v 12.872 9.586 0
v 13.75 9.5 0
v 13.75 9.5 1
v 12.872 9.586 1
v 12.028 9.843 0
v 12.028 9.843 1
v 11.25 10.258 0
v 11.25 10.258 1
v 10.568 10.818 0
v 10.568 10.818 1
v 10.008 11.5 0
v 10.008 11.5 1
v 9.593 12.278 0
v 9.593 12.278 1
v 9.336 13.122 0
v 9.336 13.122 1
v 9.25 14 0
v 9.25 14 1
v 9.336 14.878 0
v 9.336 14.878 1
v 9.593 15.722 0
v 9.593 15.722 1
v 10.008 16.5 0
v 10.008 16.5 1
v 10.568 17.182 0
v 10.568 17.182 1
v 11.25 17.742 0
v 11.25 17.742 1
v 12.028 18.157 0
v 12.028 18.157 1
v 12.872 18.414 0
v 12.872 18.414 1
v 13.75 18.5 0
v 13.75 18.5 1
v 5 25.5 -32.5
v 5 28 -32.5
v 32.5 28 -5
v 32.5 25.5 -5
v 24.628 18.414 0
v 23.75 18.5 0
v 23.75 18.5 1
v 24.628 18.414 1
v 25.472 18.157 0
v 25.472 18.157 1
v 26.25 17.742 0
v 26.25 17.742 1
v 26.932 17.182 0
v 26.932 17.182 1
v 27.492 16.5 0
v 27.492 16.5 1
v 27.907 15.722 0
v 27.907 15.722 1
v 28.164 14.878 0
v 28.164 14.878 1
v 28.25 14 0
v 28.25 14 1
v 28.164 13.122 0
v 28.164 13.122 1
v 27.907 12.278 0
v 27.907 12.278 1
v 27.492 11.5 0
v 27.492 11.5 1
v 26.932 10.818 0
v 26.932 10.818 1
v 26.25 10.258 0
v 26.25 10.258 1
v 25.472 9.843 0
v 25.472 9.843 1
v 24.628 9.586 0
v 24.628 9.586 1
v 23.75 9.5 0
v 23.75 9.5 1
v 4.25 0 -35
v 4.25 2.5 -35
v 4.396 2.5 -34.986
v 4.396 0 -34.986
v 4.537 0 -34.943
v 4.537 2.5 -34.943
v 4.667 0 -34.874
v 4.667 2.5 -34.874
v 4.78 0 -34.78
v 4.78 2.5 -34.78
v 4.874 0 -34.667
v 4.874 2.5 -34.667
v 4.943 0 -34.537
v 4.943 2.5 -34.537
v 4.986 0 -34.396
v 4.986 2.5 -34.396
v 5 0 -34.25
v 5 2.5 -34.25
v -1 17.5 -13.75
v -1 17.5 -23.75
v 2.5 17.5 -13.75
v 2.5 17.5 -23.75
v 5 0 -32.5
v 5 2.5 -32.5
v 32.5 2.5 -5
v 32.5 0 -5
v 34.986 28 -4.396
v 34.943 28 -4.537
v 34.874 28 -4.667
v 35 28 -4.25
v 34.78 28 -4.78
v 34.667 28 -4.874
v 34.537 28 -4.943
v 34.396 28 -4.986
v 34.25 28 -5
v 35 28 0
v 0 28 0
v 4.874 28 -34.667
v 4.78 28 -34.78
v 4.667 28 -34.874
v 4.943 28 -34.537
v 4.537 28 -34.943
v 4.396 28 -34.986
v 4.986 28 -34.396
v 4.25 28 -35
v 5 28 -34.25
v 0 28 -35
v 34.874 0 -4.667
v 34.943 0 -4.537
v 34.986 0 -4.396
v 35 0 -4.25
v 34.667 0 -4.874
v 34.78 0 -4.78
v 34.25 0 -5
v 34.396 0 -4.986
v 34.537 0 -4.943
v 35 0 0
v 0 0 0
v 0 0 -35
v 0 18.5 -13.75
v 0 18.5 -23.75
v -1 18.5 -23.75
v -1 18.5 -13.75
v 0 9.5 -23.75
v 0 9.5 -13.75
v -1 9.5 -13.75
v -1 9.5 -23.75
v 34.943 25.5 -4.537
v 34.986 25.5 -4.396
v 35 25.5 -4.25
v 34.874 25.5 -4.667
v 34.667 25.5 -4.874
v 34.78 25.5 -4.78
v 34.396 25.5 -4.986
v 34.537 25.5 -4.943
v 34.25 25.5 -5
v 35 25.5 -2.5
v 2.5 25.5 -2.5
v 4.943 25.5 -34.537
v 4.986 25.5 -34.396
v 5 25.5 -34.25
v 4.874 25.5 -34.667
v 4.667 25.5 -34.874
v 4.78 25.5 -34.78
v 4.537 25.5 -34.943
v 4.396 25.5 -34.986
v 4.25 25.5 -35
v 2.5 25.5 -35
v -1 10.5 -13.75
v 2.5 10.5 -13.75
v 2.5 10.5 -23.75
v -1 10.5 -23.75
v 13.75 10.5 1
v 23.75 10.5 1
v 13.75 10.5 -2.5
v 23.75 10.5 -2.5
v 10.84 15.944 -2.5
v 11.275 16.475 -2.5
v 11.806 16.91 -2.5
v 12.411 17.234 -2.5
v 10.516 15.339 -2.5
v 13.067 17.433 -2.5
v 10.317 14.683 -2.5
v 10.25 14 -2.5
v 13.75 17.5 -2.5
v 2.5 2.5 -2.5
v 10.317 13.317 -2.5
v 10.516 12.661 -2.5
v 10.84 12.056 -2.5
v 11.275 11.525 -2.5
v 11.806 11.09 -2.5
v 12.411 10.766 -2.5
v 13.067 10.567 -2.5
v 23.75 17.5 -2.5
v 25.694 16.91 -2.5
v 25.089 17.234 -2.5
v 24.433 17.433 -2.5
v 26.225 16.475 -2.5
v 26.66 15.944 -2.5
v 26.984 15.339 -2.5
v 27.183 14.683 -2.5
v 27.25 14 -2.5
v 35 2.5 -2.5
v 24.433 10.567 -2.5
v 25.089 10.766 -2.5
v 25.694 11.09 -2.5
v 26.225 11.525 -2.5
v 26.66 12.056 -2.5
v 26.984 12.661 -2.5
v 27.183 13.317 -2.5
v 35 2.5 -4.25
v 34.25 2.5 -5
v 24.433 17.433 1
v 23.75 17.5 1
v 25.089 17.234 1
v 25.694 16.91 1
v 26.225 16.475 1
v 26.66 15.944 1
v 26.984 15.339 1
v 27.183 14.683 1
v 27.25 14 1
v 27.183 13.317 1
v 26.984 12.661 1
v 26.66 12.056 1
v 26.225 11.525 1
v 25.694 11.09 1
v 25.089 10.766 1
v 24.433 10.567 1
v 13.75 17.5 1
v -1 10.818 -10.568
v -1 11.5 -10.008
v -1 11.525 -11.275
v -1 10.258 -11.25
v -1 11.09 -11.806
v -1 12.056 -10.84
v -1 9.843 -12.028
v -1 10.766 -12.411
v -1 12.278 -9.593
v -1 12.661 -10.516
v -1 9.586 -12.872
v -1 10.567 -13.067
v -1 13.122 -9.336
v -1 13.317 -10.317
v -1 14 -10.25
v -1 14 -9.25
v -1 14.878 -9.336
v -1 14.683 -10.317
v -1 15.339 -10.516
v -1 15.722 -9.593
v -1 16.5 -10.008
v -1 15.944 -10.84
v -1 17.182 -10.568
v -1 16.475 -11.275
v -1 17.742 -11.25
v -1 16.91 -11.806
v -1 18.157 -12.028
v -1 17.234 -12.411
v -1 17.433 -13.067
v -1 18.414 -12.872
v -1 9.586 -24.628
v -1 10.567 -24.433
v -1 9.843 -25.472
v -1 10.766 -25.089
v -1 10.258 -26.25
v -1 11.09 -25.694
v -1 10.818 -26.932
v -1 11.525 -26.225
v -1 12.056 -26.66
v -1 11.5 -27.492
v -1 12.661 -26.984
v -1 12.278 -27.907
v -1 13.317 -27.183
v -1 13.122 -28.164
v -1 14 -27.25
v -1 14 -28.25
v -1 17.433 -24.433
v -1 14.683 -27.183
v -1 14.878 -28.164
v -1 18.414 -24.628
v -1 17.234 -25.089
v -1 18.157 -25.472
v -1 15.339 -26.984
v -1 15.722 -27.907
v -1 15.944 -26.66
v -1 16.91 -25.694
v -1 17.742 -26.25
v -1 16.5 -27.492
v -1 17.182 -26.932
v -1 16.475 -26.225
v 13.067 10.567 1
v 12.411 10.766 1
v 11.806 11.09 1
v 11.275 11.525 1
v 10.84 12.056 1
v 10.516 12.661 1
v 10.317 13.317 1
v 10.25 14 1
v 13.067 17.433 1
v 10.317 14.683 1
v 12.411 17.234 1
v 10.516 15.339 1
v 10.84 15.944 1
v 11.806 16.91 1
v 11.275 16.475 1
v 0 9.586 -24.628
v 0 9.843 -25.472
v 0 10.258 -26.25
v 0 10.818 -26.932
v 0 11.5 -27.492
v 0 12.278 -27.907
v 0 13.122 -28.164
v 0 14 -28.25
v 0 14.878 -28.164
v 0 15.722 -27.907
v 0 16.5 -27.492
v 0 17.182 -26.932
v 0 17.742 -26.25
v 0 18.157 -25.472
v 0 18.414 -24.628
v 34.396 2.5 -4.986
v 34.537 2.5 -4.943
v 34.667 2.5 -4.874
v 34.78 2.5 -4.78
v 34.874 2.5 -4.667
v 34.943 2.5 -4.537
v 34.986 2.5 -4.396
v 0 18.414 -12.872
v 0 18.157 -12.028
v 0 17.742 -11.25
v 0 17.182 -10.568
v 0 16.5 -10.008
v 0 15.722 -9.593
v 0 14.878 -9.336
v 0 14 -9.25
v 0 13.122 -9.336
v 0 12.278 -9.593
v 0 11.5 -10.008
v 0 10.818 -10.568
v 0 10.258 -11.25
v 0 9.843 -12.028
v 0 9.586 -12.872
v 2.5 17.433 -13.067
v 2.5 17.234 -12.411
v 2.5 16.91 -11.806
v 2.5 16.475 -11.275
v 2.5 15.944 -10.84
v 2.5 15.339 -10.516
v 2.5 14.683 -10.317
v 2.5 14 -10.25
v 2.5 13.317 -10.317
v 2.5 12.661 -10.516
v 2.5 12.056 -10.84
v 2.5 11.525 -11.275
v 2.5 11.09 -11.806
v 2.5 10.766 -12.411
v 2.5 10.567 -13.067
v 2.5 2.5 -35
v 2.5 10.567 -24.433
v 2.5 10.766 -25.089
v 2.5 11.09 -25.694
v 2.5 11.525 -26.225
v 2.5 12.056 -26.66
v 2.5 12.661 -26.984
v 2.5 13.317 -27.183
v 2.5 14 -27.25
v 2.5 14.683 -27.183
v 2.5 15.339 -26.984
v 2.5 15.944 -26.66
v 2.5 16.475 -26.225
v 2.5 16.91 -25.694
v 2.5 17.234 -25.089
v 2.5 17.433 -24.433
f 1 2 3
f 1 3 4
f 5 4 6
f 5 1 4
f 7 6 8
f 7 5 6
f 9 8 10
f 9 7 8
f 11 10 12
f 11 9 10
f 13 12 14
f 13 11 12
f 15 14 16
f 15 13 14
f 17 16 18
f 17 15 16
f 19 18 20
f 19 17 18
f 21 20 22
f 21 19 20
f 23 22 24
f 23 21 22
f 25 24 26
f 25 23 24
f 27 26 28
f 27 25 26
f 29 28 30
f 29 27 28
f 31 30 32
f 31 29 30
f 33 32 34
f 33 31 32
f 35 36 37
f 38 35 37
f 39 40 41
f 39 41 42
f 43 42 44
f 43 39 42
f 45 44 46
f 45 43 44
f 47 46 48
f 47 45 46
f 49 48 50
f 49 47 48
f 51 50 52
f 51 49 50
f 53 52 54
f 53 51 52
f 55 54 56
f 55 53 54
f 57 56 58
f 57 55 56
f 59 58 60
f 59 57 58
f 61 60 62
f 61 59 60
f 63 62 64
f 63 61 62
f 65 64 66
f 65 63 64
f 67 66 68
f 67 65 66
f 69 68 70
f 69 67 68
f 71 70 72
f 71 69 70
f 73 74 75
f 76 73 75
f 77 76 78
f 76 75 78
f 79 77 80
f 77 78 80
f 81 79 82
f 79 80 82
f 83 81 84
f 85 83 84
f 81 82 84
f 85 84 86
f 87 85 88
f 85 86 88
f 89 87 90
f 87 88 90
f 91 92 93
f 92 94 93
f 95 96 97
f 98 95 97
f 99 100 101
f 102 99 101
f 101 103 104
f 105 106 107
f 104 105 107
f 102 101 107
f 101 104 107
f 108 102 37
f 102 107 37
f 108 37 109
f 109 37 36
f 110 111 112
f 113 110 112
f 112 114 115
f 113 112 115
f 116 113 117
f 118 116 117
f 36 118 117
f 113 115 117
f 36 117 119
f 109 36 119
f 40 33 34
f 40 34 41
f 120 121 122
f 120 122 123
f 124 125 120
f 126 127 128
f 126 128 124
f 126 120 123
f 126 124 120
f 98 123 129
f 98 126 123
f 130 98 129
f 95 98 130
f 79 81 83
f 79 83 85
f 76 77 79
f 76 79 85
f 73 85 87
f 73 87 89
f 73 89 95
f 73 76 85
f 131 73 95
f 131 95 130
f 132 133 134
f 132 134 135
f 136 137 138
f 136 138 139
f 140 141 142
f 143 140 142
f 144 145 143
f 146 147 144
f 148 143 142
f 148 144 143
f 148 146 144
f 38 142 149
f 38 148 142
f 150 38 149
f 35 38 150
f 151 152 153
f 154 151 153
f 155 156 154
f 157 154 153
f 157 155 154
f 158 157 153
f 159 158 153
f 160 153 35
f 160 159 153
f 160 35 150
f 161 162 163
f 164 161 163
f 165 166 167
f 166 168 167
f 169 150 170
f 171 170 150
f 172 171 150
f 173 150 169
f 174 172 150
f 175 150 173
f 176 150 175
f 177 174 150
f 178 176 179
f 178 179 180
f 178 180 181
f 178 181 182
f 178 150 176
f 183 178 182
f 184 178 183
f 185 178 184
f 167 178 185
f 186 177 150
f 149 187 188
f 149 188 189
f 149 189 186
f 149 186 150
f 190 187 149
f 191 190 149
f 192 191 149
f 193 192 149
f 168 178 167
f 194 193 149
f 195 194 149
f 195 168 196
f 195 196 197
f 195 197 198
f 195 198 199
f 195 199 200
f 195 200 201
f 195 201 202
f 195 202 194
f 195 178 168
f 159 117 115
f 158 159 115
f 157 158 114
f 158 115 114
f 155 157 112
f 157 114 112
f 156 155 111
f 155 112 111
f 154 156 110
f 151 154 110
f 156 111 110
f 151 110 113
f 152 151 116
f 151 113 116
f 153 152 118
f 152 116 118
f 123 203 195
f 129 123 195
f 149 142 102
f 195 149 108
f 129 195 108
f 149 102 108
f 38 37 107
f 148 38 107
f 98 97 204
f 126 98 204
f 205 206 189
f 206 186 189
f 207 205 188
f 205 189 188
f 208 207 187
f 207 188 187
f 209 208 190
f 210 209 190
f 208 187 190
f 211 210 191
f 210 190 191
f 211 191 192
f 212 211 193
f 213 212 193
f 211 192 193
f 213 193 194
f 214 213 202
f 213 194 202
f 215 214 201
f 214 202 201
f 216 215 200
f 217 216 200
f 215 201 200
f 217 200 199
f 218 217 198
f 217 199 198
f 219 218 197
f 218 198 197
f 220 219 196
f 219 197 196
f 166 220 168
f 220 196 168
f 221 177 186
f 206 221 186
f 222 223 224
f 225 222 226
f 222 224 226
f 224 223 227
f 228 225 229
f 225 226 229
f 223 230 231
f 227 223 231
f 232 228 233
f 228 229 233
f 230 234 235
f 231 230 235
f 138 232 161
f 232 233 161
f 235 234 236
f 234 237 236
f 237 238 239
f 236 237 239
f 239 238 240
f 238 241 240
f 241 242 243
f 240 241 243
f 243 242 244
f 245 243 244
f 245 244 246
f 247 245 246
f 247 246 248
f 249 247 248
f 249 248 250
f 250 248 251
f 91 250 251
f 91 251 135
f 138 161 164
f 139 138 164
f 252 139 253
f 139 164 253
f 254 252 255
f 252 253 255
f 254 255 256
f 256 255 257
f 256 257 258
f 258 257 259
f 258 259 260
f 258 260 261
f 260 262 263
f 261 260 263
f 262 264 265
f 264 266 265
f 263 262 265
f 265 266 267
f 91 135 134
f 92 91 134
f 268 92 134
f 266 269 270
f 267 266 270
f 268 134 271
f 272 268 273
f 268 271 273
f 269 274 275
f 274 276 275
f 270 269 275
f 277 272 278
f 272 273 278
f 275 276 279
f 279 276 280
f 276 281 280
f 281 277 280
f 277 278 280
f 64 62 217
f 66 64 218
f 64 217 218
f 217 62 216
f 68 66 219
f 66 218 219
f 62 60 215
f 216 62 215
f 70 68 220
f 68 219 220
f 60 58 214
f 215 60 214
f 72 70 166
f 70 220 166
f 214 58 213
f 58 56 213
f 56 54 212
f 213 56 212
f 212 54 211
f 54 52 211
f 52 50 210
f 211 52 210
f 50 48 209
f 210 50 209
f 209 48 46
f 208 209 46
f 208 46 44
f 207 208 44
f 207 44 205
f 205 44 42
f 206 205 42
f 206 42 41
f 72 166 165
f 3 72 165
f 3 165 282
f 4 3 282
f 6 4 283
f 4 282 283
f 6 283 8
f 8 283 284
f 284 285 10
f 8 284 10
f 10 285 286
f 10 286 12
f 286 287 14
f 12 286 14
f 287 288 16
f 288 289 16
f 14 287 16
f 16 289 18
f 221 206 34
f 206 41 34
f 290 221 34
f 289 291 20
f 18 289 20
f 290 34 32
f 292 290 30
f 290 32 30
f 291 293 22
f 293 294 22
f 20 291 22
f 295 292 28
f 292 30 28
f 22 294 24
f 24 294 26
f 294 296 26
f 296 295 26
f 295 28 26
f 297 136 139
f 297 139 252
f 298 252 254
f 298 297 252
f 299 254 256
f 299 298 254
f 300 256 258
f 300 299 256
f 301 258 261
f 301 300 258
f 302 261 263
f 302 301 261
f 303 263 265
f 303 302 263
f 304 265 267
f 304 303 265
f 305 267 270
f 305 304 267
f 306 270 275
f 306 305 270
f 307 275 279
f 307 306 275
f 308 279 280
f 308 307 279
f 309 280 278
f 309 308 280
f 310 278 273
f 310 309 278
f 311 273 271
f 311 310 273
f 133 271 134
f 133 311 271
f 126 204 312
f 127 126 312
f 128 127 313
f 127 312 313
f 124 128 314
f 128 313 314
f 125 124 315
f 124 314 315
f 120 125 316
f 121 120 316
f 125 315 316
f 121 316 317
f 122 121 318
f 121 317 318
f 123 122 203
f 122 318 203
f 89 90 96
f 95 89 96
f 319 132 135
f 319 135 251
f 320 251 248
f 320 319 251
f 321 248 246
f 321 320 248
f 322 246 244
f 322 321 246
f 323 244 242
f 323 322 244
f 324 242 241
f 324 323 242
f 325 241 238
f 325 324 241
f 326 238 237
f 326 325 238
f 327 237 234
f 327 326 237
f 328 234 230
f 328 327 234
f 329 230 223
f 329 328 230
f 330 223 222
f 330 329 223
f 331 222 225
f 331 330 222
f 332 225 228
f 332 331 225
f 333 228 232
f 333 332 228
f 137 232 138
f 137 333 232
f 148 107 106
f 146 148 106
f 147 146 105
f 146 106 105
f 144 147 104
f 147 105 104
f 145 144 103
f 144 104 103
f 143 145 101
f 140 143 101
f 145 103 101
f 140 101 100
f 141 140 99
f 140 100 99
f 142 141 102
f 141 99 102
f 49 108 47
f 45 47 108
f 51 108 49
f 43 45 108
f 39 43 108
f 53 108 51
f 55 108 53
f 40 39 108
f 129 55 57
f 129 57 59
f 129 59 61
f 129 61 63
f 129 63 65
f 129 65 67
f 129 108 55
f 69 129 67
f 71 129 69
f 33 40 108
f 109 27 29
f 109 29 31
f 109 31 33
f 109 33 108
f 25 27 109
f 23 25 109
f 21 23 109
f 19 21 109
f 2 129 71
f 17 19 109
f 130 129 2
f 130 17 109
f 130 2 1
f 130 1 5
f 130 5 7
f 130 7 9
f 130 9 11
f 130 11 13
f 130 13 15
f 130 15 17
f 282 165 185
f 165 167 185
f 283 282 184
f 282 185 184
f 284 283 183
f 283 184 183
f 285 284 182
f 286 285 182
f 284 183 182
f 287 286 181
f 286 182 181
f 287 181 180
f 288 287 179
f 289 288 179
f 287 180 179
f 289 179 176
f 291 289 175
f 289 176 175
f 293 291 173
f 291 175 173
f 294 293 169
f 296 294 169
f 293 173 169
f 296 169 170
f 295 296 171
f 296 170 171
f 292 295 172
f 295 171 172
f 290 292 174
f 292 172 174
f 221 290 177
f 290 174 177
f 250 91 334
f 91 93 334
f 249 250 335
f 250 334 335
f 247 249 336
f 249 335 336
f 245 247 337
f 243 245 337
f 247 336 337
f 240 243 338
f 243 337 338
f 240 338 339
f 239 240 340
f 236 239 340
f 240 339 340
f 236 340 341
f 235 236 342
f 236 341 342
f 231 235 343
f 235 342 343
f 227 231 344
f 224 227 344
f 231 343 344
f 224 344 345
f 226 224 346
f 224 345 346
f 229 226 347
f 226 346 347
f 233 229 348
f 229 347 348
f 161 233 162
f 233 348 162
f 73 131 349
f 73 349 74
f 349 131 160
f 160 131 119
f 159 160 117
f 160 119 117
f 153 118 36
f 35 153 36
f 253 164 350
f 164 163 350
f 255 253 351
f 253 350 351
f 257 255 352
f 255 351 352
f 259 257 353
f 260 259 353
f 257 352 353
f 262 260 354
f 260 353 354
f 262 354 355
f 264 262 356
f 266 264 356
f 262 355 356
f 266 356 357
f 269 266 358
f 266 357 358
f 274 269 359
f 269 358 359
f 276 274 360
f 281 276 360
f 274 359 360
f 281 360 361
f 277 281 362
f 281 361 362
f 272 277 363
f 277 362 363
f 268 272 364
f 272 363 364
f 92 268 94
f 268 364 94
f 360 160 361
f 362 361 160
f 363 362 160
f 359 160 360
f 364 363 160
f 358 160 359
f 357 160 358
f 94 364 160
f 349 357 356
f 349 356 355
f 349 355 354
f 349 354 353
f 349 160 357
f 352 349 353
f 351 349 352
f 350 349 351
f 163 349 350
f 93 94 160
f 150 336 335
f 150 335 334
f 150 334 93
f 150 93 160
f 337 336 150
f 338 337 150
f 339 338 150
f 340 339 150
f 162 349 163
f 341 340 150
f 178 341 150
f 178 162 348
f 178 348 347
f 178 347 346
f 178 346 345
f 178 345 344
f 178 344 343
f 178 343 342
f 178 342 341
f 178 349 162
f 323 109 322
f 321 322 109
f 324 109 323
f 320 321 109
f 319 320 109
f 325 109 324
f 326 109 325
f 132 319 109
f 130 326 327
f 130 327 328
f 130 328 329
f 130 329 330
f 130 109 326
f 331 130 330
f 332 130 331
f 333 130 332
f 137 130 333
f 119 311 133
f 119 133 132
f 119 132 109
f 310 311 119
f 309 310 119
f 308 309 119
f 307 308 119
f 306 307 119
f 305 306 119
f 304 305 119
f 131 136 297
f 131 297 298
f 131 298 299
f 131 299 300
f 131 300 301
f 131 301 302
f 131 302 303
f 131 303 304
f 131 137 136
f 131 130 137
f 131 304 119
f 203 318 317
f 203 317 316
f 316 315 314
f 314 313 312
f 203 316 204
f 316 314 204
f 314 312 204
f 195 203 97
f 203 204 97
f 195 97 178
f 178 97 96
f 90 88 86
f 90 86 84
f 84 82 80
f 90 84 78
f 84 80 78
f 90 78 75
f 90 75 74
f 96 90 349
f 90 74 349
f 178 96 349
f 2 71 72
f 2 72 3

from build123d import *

# Parameters (mm, degrees)
BOSS_EXTRUDE1_DEPTH = 28
BOSS_EXTRUDE2_DEPTH = 2.5
BOSS_EXTRUDE3_START = -25.5
BOSS_EXTRUDE3_DEPTH = 2.5
CUT_EXTRUDE1_DEPTH  = 2.5
CUT_EXTRUDE2_DEPTH  = 2.5
BOSS_EXTRUDE4_DEPTH = 1
BOSS_EXTRUDE5_DEPTH = 1


with BuildPart() as part:
    # Sketch1 → Boss-Extrude1 (new body)
    with BuildSketch(Plane(origin=(0, 0, 0), x_dir=(1, 0, 0), z_dir=(0, 1, 0))):
        Polygon((0, 0), (0, 35), (2.5, 35), (2.5, 2.5), (35, 2.5), (35, 0), align=None)
    extrude(amount=BOSS_EXTRUDE1_DEPTH)

    # Sketch2 → Boss-Extrude2 (add)
    with BuildSketch(Plane(origin=(0, 28, 0), x_dir=(1, 0, 0), z_dir=(0, 1, 0))):
        with BuildLine():
            Line((2.5, 35), (4.25, 35))
            ThreePointArc((4.25, 35), (4.780330086, 34.780330086), (5, 34.25))
            Line((5, 34.25), (5, 32.5))
            Line((5, 32.5), (32.5, 5))
            Line((32.5, 5), (34.25, 5))
            ThreePointArc((34.25, 5), (34.780330086, 4.780330086), (35, 4.25))
            Line((35, 4.25), (35, 2.5))
            Line((35, 2.5), (2.5, 2.5))
            Line((2.5, 2.5), (2.5, 35))
        make_face()
    extrude(amount=-BOSS_EXTRUDE2_DEPTH)

    # Sketch2<2> → Boss-Extrude3 (add)
    with BuildSketch(Plane(origin=(0, 28, 0), x_dir=(1, 0, 0), z_dir=(0, 1, 0)).offset(BOSS_EXTRUDE3_START)):
        with BuildLine():
            Line((2.5, 35), (4.25, 35))
            ThreePointArc((4.25, 35), (4.780330086, 34.780330086), (5, 34.25))
            Line((5, 34.25), (5, 32.5))
            Line((5, 32.5), (32.5, 5))
            Line((32.5, 5), (34.25, 5))
            ThreePointArc((34.25, 5), (34.780330086, 4.780330086), (35, 4.25))
            Line((35, 4.25), (35, 2.5))
            Line((35, 2.5), (2.5, 2.5))
            Line((2.5, 2.5), (2.5, 35))
        make_face()
    extrude(amount=-BOSS_EXTRUDE3_DEPTH)

    # Sketch3 → Cut-Extrude1 (cut)
    with BuildSketch(Plane(origin=(0, 0, -2.5), x_dir=(-1, 0, 0), z_dir=(0, 0, -1))):
        with BuildLine():
            Line((-23.75, 17.5), (-13.75, 17.5))
            ThreePointArc((-13.75, 17.5), (-10.25, 14), (-13.75, 10.5))
            Line((-13.75, 10.5), (-23.75, 10.5))
            ThreePointArc((-23.75, 10.5), (-27.25, 14), (-23.75, 17.5))
        make_face()
    extrude(amount=-CUT_EXTRUDE1_DEPTH, mode=Mode.SUBTRACT)

    # Sketch4 → Cut-Extrude2 (cut)
    with BuildSketch(Plane(origin=(2.5, 0, 0), x_dir=(0, 0, -1), z_dir=(1, 0, 0))):
        with BuildLine():
            Line((13.75, 17.5), (23.75, 17.5))
            ThreePointArc((23.75, 17.5), (27.25, 14), (23.75, 10.5))
            Line((23.75, 10.5), (13.75, 10.5))
            ThreePointArc((13.75, 10.5), (10.25, 14), (13.75, 17.5))
        make_face()
    extrude(amount=-CUT_EXTRUDE2_DEPTH, mode=Mode.SUBTRACT)

    # Sketch5 → Boss-Extrude4 (add)
    with BuildSketch(Plane.XY):
        with BuildLine():
            Line((13.75, 18.5), (23.75, 18.5))
            ThreePointArc((23.75, 18.5), (28.25, 14), (23.75, 9.5))
            Line((23.75, 9.5), (13.75, 9.5))
            ThreePointArc((13.75, 9.5), (9.25, 14), (13.75, 18.5))
        make_face()
        with BuildLine():
            Line((13.75, 17.5), (23.75, 17.5))
            ThreePointArc((23.75, 17.5), (27.25, 14), (23.75, 10.5))
            Line((23.75, 10.5), (13.75, 10.5))
            ThreePointArc((13.75, 10.5), (10.25, 14), (13.75, 17.5))
        make_face(mode=Mode.SUBTRACT)
    extrude(amount=BOSS_EXTRUDE4_DEPTH)

    # Sketch6 → Boss-Extrude5 (add)
    with BuildSketch(Plane.ZY):
        with BuildLine():
            Line((-23.75, 18.5), (-13.75, 18.5))
            ThreePointArc((-13.75, 18.5), (-9.25, 14), (-13.75, 9.5))
            Line((-13.75, 9.5), (-23.75, 9.5))
            ThreePointArc((-23.75, 9.5), (-28.25, 14), (-23.75, 18.5))
        make_face()
        with BuildLine():
            Line((-13.75, 10.5), (-23.75, 10.5))
            ThreePointArc((-23.75, 10.5), (-27.25, 14), (-23.75, 17.5))
            Line((-23.75, 17.5), (-13.75, 17.5))
            ThreePointArc((-13.75, 17.5), (-10.25, 14), (-13.75, 10.5))
        make_face(mode=Mode.SUBTRACT)
    extrude(amount=BOSS_EXTRUDE5_DEPTH)


solid = part.part
